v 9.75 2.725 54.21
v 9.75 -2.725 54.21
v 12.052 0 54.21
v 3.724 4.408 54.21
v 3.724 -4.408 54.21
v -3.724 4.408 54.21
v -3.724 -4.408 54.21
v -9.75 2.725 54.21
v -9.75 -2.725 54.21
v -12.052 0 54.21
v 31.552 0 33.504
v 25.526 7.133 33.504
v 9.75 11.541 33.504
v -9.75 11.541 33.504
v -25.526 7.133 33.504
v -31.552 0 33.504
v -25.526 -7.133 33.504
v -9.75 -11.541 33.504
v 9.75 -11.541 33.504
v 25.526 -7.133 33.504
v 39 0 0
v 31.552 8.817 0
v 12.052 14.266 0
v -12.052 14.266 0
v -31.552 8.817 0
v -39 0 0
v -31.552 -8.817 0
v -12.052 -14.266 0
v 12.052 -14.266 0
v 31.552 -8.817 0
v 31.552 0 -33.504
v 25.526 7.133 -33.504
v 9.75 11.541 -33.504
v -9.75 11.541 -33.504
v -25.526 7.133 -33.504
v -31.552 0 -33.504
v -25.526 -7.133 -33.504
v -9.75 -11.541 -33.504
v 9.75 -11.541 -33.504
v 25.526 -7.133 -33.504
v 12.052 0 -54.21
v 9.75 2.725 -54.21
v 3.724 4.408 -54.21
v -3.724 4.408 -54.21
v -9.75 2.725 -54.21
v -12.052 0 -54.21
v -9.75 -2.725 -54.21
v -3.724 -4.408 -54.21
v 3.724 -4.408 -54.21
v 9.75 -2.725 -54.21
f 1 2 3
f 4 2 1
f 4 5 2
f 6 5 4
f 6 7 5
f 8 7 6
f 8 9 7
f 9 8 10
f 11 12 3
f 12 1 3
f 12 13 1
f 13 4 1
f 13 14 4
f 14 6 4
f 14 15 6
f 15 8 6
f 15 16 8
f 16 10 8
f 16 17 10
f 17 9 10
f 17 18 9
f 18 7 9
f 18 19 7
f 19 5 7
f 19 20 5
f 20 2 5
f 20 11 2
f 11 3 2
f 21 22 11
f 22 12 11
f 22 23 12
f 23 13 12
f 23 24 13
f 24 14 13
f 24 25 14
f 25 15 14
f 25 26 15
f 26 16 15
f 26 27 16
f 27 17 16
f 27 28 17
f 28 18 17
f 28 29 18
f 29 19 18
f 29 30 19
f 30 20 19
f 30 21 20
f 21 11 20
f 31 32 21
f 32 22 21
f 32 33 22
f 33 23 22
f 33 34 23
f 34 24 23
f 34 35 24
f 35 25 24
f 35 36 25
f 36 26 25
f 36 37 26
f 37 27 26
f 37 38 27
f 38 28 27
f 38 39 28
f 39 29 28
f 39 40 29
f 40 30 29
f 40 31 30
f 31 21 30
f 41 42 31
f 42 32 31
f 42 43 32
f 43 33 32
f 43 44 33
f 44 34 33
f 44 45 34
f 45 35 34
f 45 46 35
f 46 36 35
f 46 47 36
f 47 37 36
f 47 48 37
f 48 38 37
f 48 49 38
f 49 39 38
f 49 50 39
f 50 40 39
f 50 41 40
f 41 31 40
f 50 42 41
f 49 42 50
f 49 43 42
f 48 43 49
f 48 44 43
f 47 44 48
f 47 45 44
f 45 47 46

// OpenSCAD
// Generated by SolidPython 1.0.1 on 2020-07-29 00:46:50


scale(v = [13, 5, 19]) {
	sphere(r = 3);
}
/***********************************************
*********      SolidPython code:      **********
************************************************
 
# import packages: SolidPython
from solid import *
from solid.utils import *
from itertools import chain, combinations, permutations


class Resize:

    def __init__(self, scad_file):
        self.scad_file = scad_file
        #self.scad_file = import_scad(scad_file)
        # cone/cylinder param:
        self.r1 = 0
        self.r2 = 0
        self.h = 0
        # rectangular prism param:
        self.w = 0
        self.l = 0
        # ellipse param:
        self.r = 0

    # import OpenScad code (file name corresponds to shape)


    # classify shape + parameters
    def assign(self, param1, param2, param3):
        if self.scad_file == 'cone.scad':
            self.r1 = param1
            self.r2 = param2
            self.h = param3
        elif self.scad_file == 'cylinder.scad':
            self.r1 = param1
            self.r2 = param2
            self.h = param3
        elif self.scad_file == 'rectangularPrism.scad':
            self.h = param1
            self.l = param2
            self.w = param3
        else:
            self.r = param1
            self.h = param2

    # resize parameters
    def iterate(self):
        x = range(3, 20, 2)
        i = 1
        if self.scad_file == 'cone.scad':
            tempList = list(permutations(x, 2))
            for temp in tempList:
                param1 = temp[0]
                param2 = temp[1]
                filepath = 'produced_scad_files/' + 'cone' + str(param1) + '_' + str(param2) + '_' + '.scad'
                scad_render_to_file(cylinder(h=param1, r1=param2, r2=0), filepath)

        elif self.scad_file == 'cylinder.scad':
            tempList = list(permutations(x, 3))
            for temp in tempList:
                param1 = temp[0]
                param2 = temp[1]
                filepath = 'produced_scad_files/' + 'cylinder' + str(param1) + '_' + str(param2) + '_' + '.scad'
                scad_render_to_file(cylinder(h=param1, r1=param2, r2=param2), filepath)

        elif self.scad_file == 'rectangularPrism.scad':
            tempList = list(permutations(x, 3))
            for temp in tempList:
                param1 = temp[0]
                param2 = temp[1]
                param3 = temp[2]
                filepath = 'produced_scad_files/' + 'rectangularPrism' + str(param1) + '_' + str(param2) + '_' + str(
                    param3) + '.scad'
                scad_render_to_file(cube(size=(param1, param2, param3)), filepath)

        elif self.scad_file == 'ellipse.scad':
            tempList = list(permutations(x, 4))
            for temp in tempList:
                param1 = temp[0]
                param2 = temp[1]
                param3 = temp[2]
                param4 = temp[3]
                filepath = 'produced_scad_files/' + 'ellipse' + str(param1) + '_' + str(param2) + '_' + str(param3) + '_' + str(param4) + '.scad'
                scad_render_to_file(scale([param1, param2, param3])(sphere(r=param4)), filepath)

    def render_to_scadfile(self):
        scad_render_to_file(scad, 'example.scad') 
 
************************************************/
